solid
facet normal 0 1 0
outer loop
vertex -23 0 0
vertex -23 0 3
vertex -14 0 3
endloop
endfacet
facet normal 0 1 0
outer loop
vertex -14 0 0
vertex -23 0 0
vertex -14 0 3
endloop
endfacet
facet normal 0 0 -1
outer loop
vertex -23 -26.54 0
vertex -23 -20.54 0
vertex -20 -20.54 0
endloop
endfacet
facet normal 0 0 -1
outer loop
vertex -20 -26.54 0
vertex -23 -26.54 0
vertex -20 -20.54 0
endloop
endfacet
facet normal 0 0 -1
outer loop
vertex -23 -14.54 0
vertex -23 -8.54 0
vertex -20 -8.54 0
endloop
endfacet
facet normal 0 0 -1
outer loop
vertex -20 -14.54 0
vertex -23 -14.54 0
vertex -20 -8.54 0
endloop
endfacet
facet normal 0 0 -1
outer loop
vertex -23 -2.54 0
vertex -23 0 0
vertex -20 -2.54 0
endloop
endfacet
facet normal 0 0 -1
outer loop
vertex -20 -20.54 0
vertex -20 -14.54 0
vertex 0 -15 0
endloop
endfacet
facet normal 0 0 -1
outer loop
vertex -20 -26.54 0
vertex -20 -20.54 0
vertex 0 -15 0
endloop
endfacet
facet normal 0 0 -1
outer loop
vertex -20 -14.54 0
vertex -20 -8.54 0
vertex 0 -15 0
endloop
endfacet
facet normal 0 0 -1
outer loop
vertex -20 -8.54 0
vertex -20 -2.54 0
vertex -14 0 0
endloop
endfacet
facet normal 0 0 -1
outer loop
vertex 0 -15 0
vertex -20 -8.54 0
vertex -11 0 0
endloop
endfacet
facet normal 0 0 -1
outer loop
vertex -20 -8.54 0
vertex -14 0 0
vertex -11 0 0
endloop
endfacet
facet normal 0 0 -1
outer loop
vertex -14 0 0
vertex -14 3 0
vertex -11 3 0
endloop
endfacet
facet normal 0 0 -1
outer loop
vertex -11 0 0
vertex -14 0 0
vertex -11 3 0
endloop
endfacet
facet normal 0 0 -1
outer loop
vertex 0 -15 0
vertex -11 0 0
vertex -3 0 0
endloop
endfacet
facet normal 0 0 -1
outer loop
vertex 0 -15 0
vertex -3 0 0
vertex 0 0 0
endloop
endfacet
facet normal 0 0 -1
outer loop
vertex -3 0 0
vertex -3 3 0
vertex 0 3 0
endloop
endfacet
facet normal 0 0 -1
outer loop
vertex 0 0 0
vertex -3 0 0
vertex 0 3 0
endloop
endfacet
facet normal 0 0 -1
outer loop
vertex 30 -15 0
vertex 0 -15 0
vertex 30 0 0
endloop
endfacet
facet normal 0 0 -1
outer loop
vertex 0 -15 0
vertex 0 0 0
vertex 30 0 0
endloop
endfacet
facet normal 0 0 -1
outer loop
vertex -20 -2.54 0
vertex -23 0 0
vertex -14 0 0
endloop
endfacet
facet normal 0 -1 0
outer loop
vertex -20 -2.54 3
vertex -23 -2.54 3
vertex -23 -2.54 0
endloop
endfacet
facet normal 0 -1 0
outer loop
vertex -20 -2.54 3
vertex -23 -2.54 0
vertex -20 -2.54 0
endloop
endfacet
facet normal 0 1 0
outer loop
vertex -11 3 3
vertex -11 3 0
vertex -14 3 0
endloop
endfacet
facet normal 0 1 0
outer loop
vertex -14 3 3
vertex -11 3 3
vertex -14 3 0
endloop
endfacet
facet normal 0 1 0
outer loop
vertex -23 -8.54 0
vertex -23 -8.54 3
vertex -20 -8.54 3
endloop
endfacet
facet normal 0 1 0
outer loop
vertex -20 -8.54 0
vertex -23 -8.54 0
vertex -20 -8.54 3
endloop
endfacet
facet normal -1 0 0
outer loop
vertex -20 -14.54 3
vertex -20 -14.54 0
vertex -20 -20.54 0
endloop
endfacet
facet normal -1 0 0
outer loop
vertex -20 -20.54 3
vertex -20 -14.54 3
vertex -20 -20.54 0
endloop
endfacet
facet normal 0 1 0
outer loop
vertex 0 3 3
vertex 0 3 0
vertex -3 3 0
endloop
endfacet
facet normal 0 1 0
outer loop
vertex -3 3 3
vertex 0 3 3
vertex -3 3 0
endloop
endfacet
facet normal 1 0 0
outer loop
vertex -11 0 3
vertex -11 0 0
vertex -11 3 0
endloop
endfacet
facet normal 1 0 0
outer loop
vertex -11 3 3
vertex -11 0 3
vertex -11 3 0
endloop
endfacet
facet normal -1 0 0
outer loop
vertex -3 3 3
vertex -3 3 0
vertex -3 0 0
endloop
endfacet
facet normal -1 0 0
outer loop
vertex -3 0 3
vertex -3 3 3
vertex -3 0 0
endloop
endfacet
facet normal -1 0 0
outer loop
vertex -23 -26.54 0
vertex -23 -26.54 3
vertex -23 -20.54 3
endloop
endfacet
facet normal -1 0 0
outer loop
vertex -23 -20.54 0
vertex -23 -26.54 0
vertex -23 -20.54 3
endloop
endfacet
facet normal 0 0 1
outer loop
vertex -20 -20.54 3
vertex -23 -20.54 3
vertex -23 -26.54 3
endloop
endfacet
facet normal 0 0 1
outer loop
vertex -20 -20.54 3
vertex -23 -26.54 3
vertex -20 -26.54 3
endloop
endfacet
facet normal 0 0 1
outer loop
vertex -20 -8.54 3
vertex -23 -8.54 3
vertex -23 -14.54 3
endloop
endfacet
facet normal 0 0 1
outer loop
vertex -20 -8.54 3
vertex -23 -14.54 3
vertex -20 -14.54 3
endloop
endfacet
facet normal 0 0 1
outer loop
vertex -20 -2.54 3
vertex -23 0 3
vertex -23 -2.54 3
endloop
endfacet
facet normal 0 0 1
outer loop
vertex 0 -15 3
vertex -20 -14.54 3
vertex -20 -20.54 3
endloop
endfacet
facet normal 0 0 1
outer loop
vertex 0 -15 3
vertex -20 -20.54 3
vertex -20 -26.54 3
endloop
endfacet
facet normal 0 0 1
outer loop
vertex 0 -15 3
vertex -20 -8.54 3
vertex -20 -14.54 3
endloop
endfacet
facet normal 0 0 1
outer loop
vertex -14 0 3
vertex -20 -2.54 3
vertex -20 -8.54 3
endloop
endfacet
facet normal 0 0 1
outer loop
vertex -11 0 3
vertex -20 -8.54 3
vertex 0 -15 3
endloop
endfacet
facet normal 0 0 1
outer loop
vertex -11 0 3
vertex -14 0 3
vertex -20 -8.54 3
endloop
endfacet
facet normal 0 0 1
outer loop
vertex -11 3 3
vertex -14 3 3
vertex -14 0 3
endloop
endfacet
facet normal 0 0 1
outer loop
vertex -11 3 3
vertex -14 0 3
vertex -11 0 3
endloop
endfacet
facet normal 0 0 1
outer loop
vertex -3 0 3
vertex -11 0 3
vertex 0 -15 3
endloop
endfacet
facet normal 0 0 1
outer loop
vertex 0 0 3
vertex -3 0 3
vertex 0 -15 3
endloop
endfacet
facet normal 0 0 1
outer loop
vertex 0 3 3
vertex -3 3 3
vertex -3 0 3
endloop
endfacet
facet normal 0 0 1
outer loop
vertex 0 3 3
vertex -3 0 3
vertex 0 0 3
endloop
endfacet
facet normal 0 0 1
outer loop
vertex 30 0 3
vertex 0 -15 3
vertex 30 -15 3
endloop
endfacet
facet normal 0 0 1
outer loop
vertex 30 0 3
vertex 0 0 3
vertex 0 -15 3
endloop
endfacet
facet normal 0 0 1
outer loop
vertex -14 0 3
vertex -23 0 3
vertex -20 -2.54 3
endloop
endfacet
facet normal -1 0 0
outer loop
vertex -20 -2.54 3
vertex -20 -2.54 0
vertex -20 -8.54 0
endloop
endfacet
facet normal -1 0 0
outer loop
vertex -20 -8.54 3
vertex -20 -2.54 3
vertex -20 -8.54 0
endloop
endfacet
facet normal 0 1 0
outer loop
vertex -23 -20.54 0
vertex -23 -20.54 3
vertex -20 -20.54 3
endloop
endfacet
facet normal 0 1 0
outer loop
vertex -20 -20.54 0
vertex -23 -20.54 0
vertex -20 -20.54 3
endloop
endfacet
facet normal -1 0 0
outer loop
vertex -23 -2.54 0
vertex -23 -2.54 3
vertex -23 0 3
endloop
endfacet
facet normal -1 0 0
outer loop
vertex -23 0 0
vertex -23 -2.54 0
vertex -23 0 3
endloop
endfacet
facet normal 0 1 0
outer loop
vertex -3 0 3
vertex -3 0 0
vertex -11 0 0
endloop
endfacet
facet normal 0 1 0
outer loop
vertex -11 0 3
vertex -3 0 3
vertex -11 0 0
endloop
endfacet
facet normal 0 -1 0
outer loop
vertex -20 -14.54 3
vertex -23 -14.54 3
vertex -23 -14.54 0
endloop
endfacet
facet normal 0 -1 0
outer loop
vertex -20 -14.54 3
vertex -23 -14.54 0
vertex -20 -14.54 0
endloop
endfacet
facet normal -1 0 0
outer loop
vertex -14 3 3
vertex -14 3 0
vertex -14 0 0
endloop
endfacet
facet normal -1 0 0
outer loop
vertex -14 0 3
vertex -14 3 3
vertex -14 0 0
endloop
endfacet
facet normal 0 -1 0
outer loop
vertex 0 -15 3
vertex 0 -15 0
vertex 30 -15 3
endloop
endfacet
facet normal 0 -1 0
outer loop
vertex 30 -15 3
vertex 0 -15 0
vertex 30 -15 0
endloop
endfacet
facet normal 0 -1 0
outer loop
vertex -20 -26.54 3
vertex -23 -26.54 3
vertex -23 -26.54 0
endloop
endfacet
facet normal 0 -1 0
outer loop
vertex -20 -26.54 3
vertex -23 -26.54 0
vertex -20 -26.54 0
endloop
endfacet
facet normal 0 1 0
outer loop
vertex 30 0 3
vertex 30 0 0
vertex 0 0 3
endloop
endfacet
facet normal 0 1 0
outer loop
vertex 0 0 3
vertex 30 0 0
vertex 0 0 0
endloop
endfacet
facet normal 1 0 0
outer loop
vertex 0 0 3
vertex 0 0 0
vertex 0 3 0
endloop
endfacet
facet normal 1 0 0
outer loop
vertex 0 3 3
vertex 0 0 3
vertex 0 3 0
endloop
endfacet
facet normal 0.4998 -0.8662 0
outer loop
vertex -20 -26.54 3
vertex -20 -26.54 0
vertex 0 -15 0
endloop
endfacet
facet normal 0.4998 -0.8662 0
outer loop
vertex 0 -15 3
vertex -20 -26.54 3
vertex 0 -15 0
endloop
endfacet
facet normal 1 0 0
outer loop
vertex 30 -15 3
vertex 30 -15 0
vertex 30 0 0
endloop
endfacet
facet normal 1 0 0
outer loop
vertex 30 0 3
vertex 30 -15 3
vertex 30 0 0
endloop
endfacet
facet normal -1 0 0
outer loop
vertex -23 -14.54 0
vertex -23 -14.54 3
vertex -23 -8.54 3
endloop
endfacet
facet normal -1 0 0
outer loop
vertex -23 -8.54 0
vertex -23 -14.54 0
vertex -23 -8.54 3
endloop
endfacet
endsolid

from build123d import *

# Parameters (mm, degrees)
BOSS_EXTRUDE1_DEPTH = 3
SKETCH2_W           = 3
SKETCH2_H           = 2.54
SKETCH2_H_2         = 6
BOSS_EXTRUDE2_DEPTH = 3


with BuildPart() as part:
    # Sketch1 → Boss-Extrude1 (new body)
    with BuildSketch(Plane.XY):
        Polygon((-3, 0), (-11, 0), (-11, 3), (-14, 3), (-14, 0), (-20, 0), (-20, -26.54), (0, -15), (30, -15), (30, 0), (0, 0), (0, 3), (-3, 3), align=None)
    extrude(amount=BOSS_EXTRUDE1_DEPTH)

    # Sketch2 → Boss-Extrude2 (add)
    with BuildSketch(Plane.XY.offset(3)):
        with Locations((-21.5, -1.27)):
            Rectangle(SKETCH2_W, SKETCH2_H)
        with Locations((-21.5, -11.54)):
            Rectangle(SKETCH2_W, SKETCH2_H_2)
        with Locations((-21.5, -23.54)):
            Rectangle(SKETCH2_W, SKETCH2_H_2)
    extrude(amount=-BOSS_EXTRUDE2_DEPTH)


solid = part.part
